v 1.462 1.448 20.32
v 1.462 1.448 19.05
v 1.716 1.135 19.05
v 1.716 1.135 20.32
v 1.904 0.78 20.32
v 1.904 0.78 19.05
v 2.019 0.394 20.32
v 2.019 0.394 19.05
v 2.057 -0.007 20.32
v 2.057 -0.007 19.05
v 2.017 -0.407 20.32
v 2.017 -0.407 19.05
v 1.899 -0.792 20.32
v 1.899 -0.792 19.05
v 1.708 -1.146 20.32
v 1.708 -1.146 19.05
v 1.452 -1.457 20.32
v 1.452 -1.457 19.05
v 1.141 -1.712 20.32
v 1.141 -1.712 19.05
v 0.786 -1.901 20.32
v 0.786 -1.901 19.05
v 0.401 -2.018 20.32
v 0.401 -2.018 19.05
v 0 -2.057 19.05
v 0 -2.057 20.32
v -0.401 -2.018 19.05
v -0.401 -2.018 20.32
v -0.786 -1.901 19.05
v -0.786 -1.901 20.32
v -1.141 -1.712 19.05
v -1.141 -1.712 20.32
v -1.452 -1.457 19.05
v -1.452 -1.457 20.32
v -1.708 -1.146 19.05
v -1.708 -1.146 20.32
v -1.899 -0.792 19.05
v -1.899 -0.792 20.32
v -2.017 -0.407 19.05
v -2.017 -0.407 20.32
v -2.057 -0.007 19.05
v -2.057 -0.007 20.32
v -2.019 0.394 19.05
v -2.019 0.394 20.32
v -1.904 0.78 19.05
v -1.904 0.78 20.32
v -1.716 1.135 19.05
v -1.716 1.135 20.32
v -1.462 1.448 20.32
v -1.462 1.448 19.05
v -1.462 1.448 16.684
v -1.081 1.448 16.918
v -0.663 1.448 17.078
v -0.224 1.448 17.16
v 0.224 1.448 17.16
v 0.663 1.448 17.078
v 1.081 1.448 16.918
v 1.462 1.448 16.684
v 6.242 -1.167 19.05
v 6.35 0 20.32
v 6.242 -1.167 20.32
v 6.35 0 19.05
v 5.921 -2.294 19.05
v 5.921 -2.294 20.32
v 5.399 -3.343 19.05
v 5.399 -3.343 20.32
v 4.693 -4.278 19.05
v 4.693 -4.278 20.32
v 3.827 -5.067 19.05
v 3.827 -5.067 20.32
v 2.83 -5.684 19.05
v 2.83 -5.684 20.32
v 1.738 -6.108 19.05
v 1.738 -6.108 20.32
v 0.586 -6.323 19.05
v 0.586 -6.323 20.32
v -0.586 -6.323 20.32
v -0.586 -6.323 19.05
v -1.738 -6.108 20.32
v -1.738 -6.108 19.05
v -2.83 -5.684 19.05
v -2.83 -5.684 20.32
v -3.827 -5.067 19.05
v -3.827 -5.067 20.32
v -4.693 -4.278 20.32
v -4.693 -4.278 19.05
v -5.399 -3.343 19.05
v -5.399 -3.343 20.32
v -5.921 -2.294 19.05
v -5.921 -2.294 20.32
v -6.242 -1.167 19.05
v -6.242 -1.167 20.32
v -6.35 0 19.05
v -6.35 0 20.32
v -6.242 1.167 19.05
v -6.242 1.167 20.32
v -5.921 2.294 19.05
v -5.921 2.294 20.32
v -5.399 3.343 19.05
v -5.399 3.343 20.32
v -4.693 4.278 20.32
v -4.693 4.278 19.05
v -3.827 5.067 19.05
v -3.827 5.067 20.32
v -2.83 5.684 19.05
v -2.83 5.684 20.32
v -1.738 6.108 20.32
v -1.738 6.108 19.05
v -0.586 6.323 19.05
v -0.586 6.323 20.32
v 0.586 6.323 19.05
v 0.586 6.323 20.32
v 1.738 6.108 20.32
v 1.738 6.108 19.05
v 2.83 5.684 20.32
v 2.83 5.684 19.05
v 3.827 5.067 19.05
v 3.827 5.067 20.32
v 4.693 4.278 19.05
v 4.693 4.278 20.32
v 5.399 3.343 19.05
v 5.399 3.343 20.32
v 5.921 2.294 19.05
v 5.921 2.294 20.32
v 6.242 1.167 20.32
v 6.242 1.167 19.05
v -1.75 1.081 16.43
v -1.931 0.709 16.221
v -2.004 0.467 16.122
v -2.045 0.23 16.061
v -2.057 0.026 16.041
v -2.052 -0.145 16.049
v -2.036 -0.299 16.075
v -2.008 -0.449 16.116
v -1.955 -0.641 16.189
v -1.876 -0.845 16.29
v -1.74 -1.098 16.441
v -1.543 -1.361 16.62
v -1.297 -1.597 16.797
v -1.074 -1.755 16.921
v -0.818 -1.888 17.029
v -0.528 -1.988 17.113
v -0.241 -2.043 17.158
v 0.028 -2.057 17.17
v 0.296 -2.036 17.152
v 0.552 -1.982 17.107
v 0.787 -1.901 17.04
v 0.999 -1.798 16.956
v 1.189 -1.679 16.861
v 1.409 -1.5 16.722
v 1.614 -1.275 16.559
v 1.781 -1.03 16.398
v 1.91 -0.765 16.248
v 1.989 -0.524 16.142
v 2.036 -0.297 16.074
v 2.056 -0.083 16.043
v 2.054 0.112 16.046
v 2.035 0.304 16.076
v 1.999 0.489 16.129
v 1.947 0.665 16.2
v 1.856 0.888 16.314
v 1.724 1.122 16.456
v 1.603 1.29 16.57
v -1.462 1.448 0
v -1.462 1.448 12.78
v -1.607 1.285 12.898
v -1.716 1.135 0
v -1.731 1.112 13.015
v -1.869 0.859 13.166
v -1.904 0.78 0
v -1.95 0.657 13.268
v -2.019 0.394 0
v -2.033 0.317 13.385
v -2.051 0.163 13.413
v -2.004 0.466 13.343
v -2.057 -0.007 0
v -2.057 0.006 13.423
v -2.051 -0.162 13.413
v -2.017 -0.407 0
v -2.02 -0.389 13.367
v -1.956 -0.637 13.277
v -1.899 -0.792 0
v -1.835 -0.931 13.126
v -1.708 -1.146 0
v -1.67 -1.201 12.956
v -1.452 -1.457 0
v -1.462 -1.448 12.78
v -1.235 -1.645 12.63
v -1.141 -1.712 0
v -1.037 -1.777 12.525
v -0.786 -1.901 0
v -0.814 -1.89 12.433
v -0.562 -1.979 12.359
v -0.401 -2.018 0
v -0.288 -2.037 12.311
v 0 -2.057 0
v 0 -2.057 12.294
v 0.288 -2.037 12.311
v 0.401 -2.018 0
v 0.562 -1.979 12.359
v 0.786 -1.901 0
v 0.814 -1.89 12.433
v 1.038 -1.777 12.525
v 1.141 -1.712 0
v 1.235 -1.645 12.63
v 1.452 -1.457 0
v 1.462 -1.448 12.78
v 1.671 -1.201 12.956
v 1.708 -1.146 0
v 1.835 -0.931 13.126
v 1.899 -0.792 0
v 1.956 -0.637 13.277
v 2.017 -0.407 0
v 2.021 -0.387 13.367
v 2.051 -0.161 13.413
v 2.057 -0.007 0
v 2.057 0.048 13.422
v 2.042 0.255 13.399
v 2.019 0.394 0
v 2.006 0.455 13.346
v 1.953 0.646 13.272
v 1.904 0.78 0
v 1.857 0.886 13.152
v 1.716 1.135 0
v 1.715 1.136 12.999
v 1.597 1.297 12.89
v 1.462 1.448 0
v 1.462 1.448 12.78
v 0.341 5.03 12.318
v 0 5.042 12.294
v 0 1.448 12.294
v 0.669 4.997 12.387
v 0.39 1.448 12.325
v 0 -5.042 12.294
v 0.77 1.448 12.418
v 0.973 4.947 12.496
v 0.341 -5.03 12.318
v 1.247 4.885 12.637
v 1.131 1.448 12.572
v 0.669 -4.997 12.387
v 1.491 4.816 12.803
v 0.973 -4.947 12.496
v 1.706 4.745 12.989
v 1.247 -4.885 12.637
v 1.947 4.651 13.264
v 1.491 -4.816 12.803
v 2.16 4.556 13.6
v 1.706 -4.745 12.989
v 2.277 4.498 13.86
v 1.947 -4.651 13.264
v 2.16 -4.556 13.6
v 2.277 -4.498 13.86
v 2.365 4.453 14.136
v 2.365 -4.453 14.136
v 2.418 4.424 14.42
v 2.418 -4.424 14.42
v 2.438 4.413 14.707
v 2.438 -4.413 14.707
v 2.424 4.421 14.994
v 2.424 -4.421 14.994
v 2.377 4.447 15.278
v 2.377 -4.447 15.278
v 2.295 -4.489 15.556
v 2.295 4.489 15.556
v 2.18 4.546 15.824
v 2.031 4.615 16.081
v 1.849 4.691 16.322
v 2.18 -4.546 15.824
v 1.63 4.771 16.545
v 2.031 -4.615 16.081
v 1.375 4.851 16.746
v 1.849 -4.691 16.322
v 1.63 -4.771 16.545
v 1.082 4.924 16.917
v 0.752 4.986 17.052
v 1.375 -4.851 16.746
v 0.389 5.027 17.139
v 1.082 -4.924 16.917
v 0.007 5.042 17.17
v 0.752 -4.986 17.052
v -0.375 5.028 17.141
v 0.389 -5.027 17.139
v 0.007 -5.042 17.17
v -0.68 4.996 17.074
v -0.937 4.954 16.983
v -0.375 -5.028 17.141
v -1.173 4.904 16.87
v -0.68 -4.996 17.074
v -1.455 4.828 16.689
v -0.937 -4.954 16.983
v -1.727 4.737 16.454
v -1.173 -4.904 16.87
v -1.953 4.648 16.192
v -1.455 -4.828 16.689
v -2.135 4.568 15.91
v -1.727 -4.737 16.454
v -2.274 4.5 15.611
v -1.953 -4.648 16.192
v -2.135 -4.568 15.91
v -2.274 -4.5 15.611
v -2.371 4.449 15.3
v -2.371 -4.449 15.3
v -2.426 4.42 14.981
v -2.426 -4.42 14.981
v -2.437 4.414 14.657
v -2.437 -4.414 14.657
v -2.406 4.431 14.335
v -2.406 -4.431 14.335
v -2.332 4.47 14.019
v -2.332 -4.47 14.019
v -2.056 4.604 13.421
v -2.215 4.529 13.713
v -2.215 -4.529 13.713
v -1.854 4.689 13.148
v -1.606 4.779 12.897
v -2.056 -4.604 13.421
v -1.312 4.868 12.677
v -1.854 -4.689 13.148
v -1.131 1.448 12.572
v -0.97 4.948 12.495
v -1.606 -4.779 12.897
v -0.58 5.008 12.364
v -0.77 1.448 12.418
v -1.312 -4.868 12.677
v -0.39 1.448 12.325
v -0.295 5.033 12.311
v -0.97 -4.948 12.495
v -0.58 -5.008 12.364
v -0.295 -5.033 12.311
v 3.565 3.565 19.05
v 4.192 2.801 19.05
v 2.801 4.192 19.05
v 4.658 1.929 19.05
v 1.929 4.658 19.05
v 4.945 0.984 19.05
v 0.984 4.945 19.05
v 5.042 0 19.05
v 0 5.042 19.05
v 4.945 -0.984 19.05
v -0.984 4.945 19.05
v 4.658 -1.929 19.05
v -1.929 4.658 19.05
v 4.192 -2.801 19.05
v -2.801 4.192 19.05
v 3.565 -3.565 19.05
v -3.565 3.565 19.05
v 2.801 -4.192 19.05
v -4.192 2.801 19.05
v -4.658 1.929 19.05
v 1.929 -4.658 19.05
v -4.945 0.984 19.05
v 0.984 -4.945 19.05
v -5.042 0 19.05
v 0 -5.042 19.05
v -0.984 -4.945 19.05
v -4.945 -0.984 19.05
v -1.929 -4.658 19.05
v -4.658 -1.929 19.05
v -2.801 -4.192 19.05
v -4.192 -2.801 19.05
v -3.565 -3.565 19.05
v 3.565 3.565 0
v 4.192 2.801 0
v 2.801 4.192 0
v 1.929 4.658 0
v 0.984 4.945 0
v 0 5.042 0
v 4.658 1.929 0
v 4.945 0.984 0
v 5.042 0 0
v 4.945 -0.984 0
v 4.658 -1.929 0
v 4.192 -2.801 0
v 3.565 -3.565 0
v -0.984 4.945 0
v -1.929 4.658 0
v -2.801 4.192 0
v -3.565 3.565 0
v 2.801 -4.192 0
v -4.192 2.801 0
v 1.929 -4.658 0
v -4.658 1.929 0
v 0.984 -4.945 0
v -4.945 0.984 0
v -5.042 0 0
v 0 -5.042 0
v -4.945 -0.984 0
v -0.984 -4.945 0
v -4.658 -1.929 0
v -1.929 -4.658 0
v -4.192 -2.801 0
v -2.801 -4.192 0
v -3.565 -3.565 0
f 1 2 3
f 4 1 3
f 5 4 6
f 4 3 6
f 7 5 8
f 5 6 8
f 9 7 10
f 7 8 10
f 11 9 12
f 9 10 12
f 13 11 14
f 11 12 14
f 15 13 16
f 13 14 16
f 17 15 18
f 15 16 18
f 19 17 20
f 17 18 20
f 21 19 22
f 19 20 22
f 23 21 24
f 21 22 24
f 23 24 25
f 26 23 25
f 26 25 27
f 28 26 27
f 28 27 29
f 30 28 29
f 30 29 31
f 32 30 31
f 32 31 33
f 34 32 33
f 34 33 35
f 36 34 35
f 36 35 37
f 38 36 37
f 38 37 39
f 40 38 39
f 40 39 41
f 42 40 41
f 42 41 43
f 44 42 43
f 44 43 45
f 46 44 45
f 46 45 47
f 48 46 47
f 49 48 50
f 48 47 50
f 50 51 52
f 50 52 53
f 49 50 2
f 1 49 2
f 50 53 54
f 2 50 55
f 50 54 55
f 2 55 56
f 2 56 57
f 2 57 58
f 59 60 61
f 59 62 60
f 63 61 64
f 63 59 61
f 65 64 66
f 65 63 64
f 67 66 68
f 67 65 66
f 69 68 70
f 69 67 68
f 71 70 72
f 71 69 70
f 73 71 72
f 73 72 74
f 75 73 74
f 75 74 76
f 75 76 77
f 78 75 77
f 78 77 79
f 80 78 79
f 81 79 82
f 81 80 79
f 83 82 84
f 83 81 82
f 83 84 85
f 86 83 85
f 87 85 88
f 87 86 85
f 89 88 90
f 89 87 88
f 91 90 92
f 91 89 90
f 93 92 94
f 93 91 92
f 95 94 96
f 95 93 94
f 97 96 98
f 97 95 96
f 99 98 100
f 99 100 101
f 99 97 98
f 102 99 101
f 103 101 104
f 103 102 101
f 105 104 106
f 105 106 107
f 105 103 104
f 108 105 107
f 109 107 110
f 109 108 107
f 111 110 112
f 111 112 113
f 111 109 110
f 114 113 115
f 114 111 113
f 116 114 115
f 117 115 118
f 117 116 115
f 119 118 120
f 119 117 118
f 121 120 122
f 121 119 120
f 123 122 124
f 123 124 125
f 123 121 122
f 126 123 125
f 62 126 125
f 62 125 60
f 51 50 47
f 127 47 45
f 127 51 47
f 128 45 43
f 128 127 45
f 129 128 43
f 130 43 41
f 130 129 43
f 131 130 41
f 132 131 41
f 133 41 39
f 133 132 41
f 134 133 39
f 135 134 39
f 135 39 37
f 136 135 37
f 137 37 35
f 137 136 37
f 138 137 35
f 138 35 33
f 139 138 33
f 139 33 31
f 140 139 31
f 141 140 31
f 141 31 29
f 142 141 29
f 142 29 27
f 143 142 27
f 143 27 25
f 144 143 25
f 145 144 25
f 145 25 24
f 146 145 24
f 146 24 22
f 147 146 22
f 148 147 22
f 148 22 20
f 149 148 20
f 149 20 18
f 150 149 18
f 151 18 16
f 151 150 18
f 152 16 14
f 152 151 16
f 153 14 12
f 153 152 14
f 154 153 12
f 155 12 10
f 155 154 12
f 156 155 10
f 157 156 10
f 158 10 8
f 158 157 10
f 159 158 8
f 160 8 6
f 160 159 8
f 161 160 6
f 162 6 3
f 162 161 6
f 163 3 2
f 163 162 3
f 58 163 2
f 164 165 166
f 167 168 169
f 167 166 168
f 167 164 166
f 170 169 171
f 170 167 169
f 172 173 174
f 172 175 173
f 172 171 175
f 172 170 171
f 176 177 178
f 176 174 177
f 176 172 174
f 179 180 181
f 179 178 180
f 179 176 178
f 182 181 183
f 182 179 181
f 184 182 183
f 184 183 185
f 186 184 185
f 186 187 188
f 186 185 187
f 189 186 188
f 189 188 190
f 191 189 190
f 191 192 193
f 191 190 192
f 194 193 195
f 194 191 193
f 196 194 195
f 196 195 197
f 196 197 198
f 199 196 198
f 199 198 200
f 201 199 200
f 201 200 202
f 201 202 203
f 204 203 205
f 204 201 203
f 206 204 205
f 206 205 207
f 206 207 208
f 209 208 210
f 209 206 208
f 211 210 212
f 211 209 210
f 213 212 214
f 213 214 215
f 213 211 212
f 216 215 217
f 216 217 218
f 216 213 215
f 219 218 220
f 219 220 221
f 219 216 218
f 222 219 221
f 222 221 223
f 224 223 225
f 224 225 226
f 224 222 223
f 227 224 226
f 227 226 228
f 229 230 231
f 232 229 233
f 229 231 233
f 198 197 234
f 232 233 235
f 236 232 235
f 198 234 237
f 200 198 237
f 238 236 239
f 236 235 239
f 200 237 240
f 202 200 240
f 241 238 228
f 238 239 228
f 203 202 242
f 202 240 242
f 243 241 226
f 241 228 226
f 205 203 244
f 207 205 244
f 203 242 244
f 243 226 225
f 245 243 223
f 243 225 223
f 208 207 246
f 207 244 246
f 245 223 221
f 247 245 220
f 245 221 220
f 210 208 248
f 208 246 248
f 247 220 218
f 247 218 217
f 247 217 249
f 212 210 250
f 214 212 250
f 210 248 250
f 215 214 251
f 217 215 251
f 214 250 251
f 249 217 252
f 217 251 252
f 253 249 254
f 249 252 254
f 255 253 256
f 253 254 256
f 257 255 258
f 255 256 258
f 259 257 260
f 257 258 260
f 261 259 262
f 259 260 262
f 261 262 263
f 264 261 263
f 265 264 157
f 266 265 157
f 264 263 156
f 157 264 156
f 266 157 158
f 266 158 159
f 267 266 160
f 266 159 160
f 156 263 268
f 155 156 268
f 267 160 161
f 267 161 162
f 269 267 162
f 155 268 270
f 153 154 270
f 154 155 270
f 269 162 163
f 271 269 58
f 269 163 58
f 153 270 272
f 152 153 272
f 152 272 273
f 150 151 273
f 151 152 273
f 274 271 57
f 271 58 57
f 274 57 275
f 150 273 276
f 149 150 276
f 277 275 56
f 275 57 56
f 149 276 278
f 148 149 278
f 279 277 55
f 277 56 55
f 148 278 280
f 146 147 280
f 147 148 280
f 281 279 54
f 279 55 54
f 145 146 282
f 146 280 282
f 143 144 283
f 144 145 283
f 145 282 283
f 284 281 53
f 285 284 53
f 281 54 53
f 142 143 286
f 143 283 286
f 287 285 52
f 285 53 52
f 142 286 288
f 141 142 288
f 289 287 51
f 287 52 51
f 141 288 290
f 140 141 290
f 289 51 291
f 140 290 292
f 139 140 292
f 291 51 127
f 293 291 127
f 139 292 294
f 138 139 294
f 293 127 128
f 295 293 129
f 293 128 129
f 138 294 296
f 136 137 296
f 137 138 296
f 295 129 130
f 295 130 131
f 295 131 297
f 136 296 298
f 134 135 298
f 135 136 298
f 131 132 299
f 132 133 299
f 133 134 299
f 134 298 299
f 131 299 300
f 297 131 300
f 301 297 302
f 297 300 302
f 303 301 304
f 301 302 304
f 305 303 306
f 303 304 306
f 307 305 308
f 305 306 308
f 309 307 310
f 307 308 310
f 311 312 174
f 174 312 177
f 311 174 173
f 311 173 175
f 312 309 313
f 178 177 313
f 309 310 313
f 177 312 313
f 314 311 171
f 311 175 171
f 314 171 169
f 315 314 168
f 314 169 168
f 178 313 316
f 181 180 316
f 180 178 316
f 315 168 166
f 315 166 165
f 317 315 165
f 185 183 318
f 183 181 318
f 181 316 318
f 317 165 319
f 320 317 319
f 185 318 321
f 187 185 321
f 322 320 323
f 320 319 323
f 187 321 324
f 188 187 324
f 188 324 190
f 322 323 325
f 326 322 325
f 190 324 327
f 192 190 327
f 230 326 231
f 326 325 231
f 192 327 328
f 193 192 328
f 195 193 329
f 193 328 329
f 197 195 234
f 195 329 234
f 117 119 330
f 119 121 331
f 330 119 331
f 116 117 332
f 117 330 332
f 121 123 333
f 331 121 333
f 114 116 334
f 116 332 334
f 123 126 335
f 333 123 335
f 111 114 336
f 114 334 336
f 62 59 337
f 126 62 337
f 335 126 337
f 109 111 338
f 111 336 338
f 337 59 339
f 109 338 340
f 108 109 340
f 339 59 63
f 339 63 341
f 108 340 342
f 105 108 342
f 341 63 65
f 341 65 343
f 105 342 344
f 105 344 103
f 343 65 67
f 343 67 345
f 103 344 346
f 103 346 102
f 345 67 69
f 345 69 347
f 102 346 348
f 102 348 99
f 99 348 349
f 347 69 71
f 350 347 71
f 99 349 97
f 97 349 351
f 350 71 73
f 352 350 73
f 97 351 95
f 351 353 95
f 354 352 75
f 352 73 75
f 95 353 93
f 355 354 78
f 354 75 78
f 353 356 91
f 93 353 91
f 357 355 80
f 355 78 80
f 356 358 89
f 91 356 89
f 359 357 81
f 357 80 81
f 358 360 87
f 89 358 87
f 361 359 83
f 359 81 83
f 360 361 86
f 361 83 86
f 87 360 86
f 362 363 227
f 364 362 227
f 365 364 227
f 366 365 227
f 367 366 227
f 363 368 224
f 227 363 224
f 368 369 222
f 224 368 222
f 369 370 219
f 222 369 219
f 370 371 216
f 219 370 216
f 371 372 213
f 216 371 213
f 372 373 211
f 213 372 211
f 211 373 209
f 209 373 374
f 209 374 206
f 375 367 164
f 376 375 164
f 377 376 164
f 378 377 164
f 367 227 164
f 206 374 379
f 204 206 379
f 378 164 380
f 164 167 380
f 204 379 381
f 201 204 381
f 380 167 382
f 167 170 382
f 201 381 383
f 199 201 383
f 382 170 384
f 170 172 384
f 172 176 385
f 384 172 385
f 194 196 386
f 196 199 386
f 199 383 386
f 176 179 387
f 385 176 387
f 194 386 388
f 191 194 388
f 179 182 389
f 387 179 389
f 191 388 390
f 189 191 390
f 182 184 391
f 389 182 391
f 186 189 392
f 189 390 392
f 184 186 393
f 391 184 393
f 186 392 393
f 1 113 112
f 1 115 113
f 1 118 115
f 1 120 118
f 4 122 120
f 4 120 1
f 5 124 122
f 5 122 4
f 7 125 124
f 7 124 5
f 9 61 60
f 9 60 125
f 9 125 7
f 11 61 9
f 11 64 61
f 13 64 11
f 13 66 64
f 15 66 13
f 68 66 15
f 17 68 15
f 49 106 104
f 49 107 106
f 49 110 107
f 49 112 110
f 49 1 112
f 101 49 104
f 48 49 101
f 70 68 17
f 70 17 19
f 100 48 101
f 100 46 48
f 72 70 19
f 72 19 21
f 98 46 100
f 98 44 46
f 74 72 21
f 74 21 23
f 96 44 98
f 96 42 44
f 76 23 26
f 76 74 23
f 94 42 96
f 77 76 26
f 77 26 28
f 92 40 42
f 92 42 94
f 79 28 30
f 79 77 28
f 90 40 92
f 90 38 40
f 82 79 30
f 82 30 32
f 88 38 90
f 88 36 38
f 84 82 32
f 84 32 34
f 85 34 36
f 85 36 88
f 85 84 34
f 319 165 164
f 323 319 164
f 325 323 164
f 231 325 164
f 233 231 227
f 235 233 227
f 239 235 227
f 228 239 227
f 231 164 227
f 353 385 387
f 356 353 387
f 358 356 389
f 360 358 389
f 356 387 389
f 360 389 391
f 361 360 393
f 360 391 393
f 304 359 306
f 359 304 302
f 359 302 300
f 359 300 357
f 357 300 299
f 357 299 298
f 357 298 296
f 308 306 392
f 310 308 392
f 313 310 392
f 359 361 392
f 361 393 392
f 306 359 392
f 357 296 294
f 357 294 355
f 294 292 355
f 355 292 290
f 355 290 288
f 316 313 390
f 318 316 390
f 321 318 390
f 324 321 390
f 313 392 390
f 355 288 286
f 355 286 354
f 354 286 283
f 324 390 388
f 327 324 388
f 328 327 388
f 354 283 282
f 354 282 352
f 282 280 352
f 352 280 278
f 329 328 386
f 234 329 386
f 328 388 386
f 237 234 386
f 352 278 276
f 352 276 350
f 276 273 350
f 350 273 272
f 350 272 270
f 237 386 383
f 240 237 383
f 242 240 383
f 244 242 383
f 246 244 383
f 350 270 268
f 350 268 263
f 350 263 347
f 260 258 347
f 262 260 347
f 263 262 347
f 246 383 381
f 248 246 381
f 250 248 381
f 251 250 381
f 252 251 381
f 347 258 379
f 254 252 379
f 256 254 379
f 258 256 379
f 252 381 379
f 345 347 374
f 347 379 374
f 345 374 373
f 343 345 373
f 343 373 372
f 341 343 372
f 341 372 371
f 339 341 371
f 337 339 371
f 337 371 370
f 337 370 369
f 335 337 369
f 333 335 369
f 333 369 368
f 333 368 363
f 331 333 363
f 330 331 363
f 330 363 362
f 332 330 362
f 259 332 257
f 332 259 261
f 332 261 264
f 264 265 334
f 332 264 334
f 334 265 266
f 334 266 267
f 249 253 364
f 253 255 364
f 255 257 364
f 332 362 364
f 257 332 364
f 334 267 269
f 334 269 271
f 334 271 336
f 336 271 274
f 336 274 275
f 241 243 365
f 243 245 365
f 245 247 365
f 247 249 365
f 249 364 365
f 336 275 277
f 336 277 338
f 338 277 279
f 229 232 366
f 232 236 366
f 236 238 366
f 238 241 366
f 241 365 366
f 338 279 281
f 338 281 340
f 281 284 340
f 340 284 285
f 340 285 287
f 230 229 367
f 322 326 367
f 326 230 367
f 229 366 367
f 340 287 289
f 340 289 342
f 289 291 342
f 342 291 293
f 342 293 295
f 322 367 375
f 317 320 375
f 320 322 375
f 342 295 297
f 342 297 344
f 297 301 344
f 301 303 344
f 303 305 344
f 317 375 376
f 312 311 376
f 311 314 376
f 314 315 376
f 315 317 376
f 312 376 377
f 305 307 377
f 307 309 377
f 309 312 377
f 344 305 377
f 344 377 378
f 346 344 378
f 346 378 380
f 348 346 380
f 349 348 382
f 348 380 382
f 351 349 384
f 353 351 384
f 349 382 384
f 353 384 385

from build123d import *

# Parameters (mm, degrees)
SKETCH2_R           = 5.0419
SKETCH2_R_2         = 2.0574
BOSS_EXTRUDE1_DEPTH = 19.05
BOSS_EXTRUDE2_DEPTH = 19.05
SKETCH3_R           = 2.4384
CUT_EXTRUDE1_DEPTH  = 12.7
SKETCH4_W           = 1.27
SKETCH4_H           = 6.35
CUT_EXTRUDE2_DEPTH  = 22.060567509


with BuildPart() as part:
    # Sketch2 → Boss-Extrude1 (new body)
    with BuildSketch(Plane.XY):
        with Locations(Location((0, 0, 0), (0, 0, 180))):
            Circle(SKETCH2_R)
        with Locations(Location((0, 0, 0), (0, 0, 180))):
            Circle(SKETCH2_R_2, mode=Mode.SUBTRACT)
    extrude(amount=BOSS_EXTRUDE1_DEPTH)

    # Sketch6 → Boss-Extrude2 (add)
    with BuildSketch(Plane(origin=(0, 0, 0), x_dir=(-1, 0, 0), z_dir=(0, 0, -1))):
        with BuildLine():
            Line((1.461769448, 1.4478), (-1.461769448, 1.4478))
            ThreePointArc((-1.461769448, 1.4478), (0, 2.0574), (1.461769448, 1.4478))
        make_face()
    extrude(amount=-BOSS_EXTRUDE2_DEPTH)

    # Sketch3 → Cut-Extrude1 (cut, symmetric)
    with BuildSketch(Plane.XZ):
        with Locations(Location((0, 14.732, 0), (0, 0, 270))):
            Circle(SKETCH3_R)
    extrude(amount=CUT_EXTRUDE1_DEPTH, both=True, mode=Mode.SUBTRACT)

    # Sketch4 → Revolve1 (revolve)
    with BuildSketch(Plane(origin=(0, 0, 0), x_dir=(0, 0, -1), z_dir=(1, 0, 0)), mode=Mode.PRIVATE) as revolve1_sk:
        with Locations((-19.685, 3.175)):
            Rectangle(SKETCH4_W, SKETCH4_H)
    revolve(revolve1_sk.sketch.rotate(Axis((0, 0, 0), (0, 0, -1)), 90), axis=Axis((0, 0, 0), (0, 0, -1)))

    # Sketch5 → Cut-Extrude2 (cut, through all)
    with BuildSketch(Plane(origin=(0, 0, 19.05), x_dir=(-1, 0, 0), z_dir=(0, 0, -1))):
        with BuildLine():
            Line((1.461769448, 1.4478), (-1.461769448, 1.4478))
            ThreePointArc((-1.461769448, 1.4478), (0, -2.0574), (1.461769448, 1.4478))
        make_face()
    extrude(amount=-CUT_EXTRUDE2_DEPTH, mode=Mode.SUBTRACT)


solid = part.part
